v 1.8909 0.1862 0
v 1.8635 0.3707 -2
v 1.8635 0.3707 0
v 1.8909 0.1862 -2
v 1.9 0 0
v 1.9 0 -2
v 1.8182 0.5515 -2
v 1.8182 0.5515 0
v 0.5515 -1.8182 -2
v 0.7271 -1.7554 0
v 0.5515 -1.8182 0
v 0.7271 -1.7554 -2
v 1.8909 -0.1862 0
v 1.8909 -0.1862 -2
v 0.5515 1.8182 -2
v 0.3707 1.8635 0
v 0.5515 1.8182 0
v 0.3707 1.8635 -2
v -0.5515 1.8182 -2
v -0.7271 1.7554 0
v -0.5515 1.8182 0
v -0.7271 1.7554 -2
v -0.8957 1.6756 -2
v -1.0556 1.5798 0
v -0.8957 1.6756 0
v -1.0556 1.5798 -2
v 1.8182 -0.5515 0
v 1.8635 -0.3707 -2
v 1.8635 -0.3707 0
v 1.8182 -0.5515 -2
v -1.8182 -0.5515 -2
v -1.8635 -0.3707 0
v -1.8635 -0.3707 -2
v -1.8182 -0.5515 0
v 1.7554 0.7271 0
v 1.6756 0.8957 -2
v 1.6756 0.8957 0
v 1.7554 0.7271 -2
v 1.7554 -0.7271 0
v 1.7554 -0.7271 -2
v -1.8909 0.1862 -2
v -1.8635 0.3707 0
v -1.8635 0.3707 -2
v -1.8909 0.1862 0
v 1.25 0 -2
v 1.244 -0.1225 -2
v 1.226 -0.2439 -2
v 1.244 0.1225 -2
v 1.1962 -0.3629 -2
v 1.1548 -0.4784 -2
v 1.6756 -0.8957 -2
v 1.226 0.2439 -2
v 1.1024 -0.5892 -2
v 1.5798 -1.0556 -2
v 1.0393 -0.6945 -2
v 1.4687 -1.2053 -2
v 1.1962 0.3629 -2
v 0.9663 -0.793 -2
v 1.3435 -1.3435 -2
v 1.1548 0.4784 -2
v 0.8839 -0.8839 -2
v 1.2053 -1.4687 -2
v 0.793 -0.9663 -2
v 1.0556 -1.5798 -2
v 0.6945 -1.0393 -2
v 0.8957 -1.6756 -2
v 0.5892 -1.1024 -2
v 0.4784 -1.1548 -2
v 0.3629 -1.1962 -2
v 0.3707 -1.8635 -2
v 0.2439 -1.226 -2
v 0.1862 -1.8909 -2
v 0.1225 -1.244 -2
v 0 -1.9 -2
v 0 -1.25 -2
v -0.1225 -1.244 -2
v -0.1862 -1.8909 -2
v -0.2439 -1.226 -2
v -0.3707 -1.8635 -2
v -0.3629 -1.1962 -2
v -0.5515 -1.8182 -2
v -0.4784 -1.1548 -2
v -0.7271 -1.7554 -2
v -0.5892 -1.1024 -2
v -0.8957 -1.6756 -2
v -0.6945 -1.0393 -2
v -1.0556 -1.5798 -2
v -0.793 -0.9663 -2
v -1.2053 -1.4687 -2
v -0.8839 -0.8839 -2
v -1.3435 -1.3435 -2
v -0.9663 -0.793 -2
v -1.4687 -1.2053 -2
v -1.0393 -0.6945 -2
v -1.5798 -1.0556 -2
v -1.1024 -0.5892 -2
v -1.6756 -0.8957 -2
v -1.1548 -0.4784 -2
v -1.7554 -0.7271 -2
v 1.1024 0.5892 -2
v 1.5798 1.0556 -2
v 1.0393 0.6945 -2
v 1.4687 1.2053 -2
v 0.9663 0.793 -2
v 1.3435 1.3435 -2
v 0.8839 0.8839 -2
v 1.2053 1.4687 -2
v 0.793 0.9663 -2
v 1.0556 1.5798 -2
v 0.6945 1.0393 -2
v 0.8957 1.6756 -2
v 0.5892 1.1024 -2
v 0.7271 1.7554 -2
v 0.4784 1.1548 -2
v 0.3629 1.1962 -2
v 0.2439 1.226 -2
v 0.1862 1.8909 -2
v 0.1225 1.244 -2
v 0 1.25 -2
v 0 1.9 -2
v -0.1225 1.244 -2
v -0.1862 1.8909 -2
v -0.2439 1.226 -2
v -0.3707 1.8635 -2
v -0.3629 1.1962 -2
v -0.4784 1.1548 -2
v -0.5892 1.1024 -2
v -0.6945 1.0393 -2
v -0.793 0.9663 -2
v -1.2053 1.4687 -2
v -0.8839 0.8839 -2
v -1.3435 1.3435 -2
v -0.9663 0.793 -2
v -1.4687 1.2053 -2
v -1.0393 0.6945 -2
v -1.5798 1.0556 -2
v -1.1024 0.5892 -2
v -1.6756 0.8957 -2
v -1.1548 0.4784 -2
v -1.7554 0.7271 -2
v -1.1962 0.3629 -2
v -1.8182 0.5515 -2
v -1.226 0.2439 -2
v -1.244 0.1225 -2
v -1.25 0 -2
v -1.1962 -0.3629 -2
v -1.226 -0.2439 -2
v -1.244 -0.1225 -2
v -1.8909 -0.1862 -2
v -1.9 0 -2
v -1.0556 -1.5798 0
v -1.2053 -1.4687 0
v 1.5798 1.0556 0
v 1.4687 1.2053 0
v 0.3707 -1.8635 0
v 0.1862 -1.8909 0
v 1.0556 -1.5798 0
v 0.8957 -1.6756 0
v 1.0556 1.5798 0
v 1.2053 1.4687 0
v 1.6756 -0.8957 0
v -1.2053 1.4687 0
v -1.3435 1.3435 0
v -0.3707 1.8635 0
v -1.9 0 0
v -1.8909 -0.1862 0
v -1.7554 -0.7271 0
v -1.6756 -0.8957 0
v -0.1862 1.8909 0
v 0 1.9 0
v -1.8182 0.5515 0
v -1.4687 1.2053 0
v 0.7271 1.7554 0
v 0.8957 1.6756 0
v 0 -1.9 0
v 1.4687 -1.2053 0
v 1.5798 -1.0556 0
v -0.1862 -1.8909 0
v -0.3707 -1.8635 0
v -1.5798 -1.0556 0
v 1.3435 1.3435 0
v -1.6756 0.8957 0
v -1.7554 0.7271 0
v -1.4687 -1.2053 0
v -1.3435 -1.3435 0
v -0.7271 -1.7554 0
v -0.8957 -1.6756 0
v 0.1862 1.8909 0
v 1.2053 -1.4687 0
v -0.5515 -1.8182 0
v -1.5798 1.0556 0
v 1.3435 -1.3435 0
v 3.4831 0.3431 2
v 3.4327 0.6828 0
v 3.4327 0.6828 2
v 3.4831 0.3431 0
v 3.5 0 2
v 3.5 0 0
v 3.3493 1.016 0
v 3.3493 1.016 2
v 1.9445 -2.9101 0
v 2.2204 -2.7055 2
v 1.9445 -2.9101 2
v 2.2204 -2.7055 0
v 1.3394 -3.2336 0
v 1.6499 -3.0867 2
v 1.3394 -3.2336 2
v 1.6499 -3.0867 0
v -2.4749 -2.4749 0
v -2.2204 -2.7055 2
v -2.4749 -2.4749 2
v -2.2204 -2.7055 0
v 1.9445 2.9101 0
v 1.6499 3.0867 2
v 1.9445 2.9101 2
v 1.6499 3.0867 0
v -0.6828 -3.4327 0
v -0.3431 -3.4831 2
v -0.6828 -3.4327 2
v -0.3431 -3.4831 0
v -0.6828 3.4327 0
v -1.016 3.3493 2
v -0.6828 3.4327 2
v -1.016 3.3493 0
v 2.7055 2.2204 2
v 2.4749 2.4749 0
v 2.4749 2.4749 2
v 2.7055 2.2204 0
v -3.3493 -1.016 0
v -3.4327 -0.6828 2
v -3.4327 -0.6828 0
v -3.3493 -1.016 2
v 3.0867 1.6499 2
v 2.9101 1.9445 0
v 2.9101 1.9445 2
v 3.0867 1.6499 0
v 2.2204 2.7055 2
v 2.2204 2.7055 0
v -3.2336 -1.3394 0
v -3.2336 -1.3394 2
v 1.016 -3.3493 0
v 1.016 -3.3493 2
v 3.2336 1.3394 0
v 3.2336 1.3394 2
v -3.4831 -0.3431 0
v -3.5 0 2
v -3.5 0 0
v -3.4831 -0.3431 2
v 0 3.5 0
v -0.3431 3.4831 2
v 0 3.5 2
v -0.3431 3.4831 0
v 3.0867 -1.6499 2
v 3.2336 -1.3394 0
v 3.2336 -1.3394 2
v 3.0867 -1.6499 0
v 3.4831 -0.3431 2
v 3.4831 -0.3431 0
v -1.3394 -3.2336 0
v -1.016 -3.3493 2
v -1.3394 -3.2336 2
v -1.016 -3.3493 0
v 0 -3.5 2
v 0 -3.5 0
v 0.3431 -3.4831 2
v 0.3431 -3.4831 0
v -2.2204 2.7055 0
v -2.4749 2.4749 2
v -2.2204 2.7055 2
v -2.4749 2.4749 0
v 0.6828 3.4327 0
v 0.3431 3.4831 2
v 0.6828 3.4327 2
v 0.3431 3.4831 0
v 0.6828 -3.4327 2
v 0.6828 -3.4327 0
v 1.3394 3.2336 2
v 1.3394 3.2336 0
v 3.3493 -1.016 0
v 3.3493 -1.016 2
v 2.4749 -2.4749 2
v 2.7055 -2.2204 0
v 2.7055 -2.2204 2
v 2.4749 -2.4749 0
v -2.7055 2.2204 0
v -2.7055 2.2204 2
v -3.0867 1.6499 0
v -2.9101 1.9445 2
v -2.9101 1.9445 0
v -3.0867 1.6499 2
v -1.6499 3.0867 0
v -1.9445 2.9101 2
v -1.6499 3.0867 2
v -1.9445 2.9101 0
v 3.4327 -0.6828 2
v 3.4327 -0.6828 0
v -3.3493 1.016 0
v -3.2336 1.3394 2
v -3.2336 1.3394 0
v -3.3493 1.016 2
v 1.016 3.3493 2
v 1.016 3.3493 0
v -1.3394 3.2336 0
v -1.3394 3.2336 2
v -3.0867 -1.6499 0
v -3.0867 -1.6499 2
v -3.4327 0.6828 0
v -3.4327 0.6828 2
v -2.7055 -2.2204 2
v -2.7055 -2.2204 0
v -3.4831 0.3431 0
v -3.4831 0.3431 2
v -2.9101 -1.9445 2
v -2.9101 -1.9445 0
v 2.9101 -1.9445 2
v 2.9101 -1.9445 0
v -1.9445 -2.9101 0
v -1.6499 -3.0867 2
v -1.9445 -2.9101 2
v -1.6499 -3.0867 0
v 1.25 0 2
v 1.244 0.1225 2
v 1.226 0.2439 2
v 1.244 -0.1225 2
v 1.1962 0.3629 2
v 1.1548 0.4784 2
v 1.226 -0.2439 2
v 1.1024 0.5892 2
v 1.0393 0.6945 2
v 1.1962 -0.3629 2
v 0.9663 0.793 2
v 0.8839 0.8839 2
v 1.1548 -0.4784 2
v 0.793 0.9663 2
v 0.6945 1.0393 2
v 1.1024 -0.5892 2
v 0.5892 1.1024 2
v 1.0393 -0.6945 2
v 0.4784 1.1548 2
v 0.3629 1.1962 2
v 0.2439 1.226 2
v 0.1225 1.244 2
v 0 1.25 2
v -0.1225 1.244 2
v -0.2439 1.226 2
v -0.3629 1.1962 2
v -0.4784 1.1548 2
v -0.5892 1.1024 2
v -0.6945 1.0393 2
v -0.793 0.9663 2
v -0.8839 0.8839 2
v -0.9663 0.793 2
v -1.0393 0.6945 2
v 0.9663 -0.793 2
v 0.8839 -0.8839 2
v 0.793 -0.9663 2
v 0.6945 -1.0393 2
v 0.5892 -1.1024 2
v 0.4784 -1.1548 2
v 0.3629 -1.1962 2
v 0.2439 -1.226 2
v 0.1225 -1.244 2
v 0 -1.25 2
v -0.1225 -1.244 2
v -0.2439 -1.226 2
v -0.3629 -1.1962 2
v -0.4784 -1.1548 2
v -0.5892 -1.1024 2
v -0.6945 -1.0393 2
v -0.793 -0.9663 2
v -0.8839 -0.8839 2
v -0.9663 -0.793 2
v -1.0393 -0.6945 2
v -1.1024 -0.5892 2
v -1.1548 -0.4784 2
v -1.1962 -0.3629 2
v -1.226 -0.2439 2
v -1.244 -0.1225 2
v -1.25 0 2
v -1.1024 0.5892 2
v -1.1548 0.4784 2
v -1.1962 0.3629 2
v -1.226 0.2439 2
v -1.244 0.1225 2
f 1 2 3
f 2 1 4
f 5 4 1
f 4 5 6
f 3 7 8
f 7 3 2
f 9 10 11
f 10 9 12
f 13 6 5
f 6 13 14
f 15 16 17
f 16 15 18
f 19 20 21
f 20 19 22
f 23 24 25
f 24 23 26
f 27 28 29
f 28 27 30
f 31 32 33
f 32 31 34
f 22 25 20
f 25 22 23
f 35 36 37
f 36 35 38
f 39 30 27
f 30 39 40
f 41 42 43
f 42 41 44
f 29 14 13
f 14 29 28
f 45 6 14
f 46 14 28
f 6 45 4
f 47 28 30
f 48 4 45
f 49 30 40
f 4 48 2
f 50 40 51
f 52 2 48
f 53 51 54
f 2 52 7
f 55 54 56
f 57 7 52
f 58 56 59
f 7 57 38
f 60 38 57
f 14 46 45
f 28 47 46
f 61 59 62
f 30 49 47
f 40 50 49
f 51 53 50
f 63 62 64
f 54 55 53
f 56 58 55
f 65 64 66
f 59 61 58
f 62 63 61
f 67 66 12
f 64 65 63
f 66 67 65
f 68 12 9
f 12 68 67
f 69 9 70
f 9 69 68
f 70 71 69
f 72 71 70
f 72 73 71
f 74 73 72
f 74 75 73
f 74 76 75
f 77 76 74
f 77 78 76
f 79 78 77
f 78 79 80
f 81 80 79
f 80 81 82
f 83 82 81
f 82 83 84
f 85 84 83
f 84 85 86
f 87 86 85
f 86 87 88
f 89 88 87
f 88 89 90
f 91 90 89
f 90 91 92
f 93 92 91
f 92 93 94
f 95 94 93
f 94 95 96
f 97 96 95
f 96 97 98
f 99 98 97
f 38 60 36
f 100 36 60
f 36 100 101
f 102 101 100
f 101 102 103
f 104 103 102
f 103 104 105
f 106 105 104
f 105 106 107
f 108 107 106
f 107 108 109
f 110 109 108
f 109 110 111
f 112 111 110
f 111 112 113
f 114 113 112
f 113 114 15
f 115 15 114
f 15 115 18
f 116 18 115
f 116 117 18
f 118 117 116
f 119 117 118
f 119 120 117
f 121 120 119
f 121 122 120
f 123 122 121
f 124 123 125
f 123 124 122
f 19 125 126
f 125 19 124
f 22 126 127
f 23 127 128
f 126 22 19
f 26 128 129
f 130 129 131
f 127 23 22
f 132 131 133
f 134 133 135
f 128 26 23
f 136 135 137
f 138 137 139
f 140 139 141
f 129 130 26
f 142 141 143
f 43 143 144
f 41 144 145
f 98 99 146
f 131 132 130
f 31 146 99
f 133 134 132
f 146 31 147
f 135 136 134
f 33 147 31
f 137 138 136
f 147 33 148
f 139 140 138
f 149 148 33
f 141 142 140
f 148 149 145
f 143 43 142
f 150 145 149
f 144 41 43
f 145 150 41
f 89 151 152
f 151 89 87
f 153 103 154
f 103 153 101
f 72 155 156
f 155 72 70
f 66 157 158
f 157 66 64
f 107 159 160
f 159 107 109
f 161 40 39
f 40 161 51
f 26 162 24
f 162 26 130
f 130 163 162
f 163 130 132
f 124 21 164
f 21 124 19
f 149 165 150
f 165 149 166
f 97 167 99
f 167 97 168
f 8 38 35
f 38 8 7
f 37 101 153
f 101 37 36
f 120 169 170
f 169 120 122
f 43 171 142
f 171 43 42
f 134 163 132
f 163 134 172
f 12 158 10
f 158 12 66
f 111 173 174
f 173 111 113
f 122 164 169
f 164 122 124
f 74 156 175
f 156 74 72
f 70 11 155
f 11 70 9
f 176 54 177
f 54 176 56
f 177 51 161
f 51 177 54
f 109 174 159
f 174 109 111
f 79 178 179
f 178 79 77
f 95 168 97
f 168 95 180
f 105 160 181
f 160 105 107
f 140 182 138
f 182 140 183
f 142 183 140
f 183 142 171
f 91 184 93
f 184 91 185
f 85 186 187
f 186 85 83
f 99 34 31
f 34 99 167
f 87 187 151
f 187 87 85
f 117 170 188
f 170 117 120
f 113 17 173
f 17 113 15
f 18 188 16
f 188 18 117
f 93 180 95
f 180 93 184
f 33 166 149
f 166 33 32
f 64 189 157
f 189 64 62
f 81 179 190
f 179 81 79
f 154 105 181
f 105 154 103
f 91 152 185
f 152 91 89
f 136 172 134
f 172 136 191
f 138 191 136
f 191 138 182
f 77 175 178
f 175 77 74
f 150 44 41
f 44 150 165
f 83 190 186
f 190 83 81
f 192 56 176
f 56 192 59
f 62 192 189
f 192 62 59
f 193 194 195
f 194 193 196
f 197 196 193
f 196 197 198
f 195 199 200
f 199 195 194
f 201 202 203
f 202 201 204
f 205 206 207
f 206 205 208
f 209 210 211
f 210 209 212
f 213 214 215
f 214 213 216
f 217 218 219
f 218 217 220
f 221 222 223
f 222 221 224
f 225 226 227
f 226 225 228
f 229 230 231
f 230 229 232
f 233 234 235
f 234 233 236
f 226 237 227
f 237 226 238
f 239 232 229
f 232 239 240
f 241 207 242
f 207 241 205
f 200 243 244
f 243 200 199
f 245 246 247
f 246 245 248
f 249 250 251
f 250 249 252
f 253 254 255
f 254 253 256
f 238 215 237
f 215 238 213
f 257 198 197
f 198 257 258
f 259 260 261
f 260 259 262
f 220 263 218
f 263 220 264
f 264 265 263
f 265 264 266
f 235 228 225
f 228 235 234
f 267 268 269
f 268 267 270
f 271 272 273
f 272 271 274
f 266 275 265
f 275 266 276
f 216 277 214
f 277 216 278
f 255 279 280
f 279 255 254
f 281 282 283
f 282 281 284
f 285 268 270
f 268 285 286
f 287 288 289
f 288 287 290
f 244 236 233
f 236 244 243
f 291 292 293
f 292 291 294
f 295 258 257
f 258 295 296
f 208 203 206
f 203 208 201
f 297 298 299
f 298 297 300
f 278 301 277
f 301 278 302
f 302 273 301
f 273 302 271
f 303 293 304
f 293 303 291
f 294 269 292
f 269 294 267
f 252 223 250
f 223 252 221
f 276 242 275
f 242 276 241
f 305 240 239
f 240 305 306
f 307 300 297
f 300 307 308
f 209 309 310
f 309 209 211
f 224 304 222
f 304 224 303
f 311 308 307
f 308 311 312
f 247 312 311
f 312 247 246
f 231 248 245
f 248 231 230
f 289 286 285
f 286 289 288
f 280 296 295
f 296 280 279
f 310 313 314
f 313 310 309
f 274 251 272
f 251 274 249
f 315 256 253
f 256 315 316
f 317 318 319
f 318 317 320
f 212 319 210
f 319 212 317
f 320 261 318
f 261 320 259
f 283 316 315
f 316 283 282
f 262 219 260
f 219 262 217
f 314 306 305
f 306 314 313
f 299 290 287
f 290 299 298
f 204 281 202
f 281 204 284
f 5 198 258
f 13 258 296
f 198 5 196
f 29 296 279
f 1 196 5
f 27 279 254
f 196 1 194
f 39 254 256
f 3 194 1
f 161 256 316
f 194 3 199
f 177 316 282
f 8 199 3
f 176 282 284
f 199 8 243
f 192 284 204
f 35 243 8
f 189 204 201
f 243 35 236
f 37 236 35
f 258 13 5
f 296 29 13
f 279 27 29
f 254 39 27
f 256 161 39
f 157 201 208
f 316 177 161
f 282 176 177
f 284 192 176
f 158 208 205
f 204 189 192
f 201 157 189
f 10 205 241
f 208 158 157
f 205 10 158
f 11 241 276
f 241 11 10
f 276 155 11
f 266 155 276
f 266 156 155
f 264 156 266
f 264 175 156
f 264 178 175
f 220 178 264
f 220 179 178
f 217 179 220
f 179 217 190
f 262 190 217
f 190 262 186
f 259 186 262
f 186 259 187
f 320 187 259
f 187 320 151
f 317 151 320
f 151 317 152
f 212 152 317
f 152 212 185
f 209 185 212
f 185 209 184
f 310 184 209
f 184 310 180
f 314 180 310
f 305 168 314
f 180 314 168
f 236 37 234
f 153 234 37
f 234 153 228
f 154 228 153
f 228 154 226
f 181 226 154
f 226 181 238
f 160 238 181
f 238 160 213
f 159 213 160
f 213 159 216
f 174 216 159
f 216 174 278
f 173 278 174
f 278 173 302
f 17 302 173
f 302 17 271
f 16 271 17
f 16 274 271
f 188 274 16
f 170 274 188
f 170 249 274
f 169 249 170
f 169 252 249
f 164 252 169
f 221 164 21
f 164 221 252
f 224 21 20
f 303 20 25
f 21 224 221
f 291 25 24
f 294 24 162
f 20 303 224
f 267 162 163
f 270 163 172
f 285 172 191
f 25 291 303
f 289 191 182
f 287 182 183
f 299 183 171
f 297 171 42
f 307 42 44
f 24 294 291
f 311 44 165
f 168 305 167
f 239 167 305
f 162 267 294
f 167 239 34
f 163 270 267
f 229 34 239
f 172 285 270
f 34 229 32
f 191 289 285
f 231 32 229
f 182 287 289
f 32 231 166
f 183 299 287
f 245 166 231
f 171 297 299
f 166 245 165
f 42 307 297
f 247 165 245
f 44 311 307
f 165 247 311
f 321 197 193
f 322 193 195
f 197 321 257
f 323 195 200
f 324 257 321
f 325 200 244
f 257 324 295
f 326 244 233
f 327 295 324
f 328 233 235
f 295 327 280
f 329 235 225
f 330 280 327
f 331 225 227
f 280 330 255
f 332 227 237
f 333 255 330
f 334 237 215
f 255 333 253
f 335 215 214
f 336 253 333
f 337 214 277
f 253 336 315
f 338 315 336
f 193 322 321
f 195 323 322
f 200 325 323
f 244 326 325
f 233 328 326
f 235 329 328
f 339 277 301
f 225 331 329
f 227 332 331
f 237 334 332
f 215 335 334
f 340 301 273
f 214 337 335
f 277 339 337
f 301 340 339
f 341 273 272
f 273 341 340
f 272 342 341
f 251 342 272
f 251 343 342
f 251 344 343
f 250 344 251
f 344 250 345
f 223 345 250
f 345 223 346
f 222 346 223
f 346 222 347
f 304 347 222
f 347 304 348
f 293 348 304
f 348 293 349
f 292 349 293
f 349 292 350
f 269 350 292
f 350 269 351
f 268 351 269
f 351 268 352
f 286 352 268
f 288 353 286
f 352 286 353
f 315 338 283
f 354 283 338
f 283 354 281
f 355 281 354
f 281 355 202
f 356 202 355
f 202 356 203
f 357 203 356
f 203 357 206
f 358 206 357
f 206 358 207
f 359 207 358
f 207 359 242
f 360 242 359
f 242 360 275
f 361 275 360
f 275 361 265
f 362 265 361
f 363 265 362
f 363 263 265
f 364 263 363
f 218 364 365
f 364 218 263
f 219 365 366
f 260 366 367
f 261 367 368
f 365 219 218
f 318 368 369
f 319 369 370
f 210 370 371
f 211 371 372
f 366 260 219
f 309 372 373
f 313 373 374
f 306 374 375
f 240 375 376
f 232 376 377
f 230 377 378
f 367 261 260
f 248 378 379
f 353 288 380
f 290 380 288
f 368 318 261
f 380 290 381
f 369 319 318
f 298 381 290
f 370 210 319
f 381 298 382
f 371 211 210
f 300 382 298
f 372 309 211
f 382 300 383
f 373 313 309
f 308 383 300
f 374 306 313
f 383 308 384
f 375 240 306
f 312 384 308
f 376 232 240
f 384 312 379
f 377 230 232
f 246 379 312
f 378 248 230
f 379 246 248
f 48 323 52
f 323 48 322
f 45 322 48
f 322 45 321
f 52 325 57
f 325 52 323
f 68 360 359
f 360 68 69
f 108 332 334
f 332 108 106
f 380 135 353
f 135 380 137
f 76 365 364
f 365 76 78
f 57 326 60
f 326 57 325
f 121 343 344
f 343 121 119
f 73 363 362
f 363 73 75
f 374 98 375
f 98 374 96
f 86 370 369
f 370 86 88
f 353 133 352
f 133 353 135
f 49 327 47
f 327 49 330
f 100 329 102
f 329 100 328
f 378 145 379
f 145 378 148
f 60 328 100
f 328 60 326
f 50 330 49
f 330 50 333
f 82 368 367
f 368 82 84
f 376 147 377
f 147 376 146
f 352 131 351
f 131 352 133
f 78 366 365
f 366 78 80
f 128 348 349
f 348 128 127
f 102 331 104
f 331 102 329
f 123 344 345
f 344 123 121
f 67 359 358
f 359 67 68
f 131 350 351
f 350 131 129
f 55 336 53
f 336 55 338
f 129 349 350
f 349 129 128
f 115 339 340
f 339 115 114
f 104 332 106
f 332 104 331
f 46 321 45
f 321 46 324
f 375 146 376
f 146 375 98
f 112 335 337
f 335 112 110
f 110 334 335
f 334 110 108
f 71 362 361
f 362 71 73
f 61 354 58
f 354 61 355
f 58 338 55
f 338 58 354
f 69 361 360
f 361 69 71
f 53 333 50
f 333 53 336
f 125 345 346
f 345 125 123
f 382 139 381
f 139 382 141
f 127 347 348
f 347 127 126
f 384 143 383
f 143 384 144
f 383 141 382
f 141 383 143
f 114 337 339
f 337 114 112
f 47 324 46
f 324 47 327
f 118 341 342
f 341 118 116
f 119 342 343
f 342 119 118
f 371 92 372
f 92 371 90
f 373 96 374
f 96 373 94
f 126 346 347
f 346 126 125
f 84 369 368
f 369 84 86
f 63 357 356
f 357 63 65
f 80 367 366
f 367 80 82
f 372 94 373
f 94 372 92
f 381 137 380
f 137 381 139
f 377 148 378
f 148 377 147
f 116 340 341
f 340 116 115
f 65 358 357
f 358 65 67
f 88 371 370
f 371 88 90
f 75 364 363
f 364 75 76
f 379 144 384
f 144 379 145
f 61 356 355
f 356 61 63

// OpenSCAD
// file: parts.scad
/**
 * Martin Egli
 * 2022-10-30
 * 12 cm ventilator to suck solder fumes
 */

module vent12cm(col = "Gray", loc_res = 32) {
    distxy = (110+100.5)/2;
    distxy2 = distxy/2;

    color(col) {
        difference() {
            union() {    
                hull() {
                    translate([+distxy2, +distxy2, 0])
                    cylinder(r=7.5, h=25, $fn = loc_res);
                    translate([+distxy2, -distxy2, 0])
                    cylinder(r=7.5, h=25, $fn = loc_res);
                    translate([-distxy2, +distxy2, 0])
                    cylinder(r=7.5, h=25, $fn = loc_res);
                    translate([-distxy2, -distxy2, 0])
                    cylinder(r=7.5, h=25, $fn = loc_res);
                }
            }
            // M4 holes
            translate([+distxy2, +distxy2, -1])
            cylinder(d=4.5, h=25+2, $fn = loc_res);
            translate([+distxy2, -distxy2, -1])
            cylinder(d=4.5, h=25+2, $fn = loc_res);
            translate([-distxy2, +distxy2, -1])
            cylinder(d=4.5, h=25+2, $fn = loc_res);
            translate([-distxy2, -distxy2, -1])
            cylinder(d=4.5, h=25+2, $fn = loc_res);
            // center hole for vent
            translate([0, 0, -1])
            cylinder(d=120-2-2, h=25+2, $fn = loc_res);
        }
        translate([0, 0, 0])
        cylinder(d=40, h=4, $fn = loc_res);
        translate([0, 0, 5])
        cylinder(d=40, h=20, $fn = loc_res);

        r1 = (20-2);
        for(n=[0:1:3]) {
            hull() {
                translate([r1*sin(n*90+45), r1*cos(n*90+45), 0])
                cylinder(d=4, h=4, $fn = loc_res);
                translate([r1*sin(n*90+45)+64*sin(n*90+(45+90)), r1*cos(n*90+45)+64*cos(n*90+(45+90)), 0])
                cylinder(d=4, h=4, $fn = loc_res);
            }
        }
    }
}

module filter(col = "Gray", loc_res = 32) {
    color(col)
    translate([-130/2, -130/2, 0])
    cube([130, 130, 11]);
}
// main file
/**
 * Martin Egli
 * 2022-10-30
 * 12 cm ventilator to suck solder fumes
 */
use <parts.scad>

module part1(col = "LightGreen", loc_res = 32) {
    distxy = (110+100.5)/2;
    distxy2 = distxy/2;
    distxy3 = 132/2 - 15/2 +3;
    distz = 12;

    color(col) {
        difference() {
            union() {   
                hull() { 
                    hull() {
                        translate([+distxy2, +distxy2, 0])
                        cylinder(r=7.5, h=0.1, $fn = loc_res);
                        translate([+distxy2, -distxy2, 0])
                        cylinder(r=7.5, h=0.1, $fn = loc_res);
                        translate([-distxy2, +distxy2, 0])
                        cylinder(r=7.5, h=0.1, $fn = loc_res);
                        translate([-distxy2, -distxy2, 0])
                        cylinder(r=7.5, h=0.1, $fn = loc_res);
                    }

                    hull() {
                        translate([+distxy3, +distxy3, distz])
                        cylinder(r=7.5, h=0.1, $fn = loc_res);
                        translate([+distxy3, -distxy3, distz])
                        cylinder(r=7.5, h=0.1, $fn = loc_res);
                        translate([-distxy3, +distxy3, distz])
                        cylinder(r=7.5, h=0.1, $fn = loc_res);
                        translate([-distxy3, -distxy3, distz])
                        cylinder(r=7.5, h=0.1, $fn = loc_res);
                    }
                }
                // holder
                hull() {
                    translate([132/2+distz*3/4, 20/2, distz/2])
                    rotate([90, 0, 0])
                    cylinder(d = distz, h = 20, $fn = loc_res);
                    translate([0, 20/2, distz/2])
                    rotate([90, 0, 0])
                    cylinder(d = distz, h = 20, $fn = loc_res);
                }
            }
            // M3 holes
            translate([+distxy2, +distxy2, -1])
            cylinder(d=3, h=distz+20, $fn = loc_res);
            translate([+distxy2, -distxy2, -1])
            cylinder(d=3, h=distz+20, $fn = loc_res);
            translate([-distxy2, +distxy2, -1])
            cylinder(d=3, h=distz+20, $fn = loc_res);
            translate([-distxy2, -distxy2, -1])
            cylinder(d=3, h=distz+20, $fn = loc_res);
            // M3 hole for holder
            #translate([132/2+distz*3/4, 20/2+1, distz/2])
            rotate([90, 0, 0])
            cylinder(d = 3, h = 20+2, $fn = loc_res);
            // center hole for vent
            translate([0, 0, -1])
            cylinder(d1=120-2-2, d2 = (120-2-2)+16, h=distz+2, $fn = loc_res);
        }
        // honeycomb separator
        honey_th = 2;
        honey_rad = 10;
        honey_dia = 10-0.5;
        translate([0, 0, distz-honey_th]) {
            difference() {
                translate([0, 0, 0])
                cylinder(d = (120-2-2)+16, h=honey_th+0.1, $fn = loc_res);
                for(n = [-7:1:7]) {
                    for(m = [-7:1:7]) {
                        xmov = n*honey_rad*sin(60);
                        ymov = n*honey_rad*cos(60);
                        translate([xmov, m*honey_rad+ymov, -1])
                        cylinder(d = honey_dia, h = honey_th+2, $fn = 6);
                    }
                }
            }
        }
    }
}

module part2(col = "Red", loc_res = 32) {
    distxy = (110+100.5)/2;
    distxy2 = distxy/2;
    distxy3 = 132/2 - 15/2 +3;
    distxy4 = 132/2 - 15/2 +1;
    edge_rad = (15-2)/2;
    distz = 12;

    color(col) {
        difference() {
            union() {
                difference() {
                    union() {    
                        hull() {
                            translate([+distxy3, +distxy3, 0])
                            cylinder(r=7.5, h=distz, $fn = loc_res);
                            translate([+distxy3, -distxy3, 0])
                            cylinder(r=7.5, h=distz, $fn = loc_res);
                            translate([-distxy3, +distxy3, 0])
                            cylinder(r=7.5, h=distz, $fn = loc_res);
                            translate([-distxy3, -distxy3, 0])
                            cylinder(r=7.5, h=distz, $fn = loc_res);
                        }
                    }
                    // center hole for vent
                    hull() {
                            translate([+distxy4, +distxy4, -1])
                            cylinder(r=edge_rad, h=distz+2, $fn = loc_res);
                            translate([+distxy4, -distxy4, -1])
                            cylinder(r=edge_rad, h=distz+2, $fn = loc_res);
                            translate([-distxy4, +distxy4, -1])
                            cylinder(r=edge_rad, h=distz+2, $fn = loc_res);
                            translate([-distxy4, -distxy4, -1])
                            cylinder(r=edge_rad, h=distz+2, $fn = loc_res);
                        }
                    
                }
            
                // honeycomb grill
                honey_th = 2;
                honey_rad = 11;
                honey_dia = 11.5;
                translate([0, 0, distz-honey_th]) {
                    difference() {
                        hull() {
                            translate([+distxy4, +distxy4, 0])
                            cylinder(r=edge_rad, h=honey_th, $fn = loc_res);
                            translate([+distxy4, -distxy4, 0])
                            cylinder(r=edge_rad, h=honey_th, $fn = loc_res);
                            translate([-distxy4, +distxy4, 0])
                            cylinder(r=edge_rad, h=honey_th, $fn = loc_res);
                            translate([-distxy4, -distxy4, 0])
                            cylinder(r=edge_rad, h=honey_th, $fn = loc_res);
                        }
                        for(n = [-10:1:10]) {
                            for(m = [-10:1:10]) {
                                xmov = n*honey_rad*sin(60);
                                ymov = n*honey_rad*cos(60);
                                translate([xmov, m*honey_rad+ymov, -1])
                                cylinder(d = honey_dia, h = honey_th+2, $fn = 6);
                            }
                        }
                    }
                }
                // screw mounts
                translate([0, 0, distz-honey_th]) {
                    union() {
                        translate([+distxy2, +distxy2, 0])
                        cylinder(d=10, honey_th, $fn = loc_res);
                        translate([+distxy2, -distxy2, 0])
                        cylinder(d=10, honey_th, $fn = loc_res);
                        translate([-distxy2, +distxy2, 0])
                        cylinder(d=10, honey_th, $fn = loc_res);
                        translate([-distxy2, -distxy2, 0])
                        cylinder(d=10, honey_th, $fn = loc_res);
                    }
                }
            }
            // M3 holes
            translate([+distxy2, +distxy2, -1])
            cylinder(d=3, h=distz+20, $fn = loc_res);
            translate([+distxy2, -distxy2, -1])
            cylinder(d=3, h=distz+20, $fn = loc_res);
            translate([-distxy2, +distxy2, -1])
            cylinder(d=3, h=distz+20, $fn = loc_res);
            translate([-distxy2, -distxy2, -1])
            cylinder(d=3, h=distz+20, $fn = loc_res);
        }
    }
}

// stand
module part3(col = "Violet", loc_res = 32) {
    distxy = (110+100.5)/2;
    distxy2 = distxy/2;
    distxy3 = 132/2 - 15/2 +3;
    distz = 12;

    color(col) {
        difference() {
            union() {   
                // holder
                hull() {
                    translate([0, -20/2, distz/2])
                    rotate([90, 0, 0])
                    cylinder(d = distz, h = 10, $fn = loc_res);
                    translate([2*distz, -20/2, distz/2])
                    rotate([90, 0, 0])
                    cylinder(d = distz, h = 10, $fn = loc_res);
                }
                hull() {
                    translate([0, 20, distz/2])
                    rotate([90, 0, 0])
                    cylinder(d = distz, h = 10, $fn = loc_res);
                    translate([2*distz, 20, distz/2])
                    rotate([90, 0, 0])
                    cylinder(d = distz, h = 10, $fn = loc_res);
                }
                hull() {
                    translate([2*distz, +(20-5), distz/2])
                    rotate([0, 90, 0])
                    cylinder(d = 14, h = distz/2, $fn = loc_res);
                    translate([2*distz+3, -(20-5), distz/2])
                    rotate([0, 90, 0])
                    cylinder(d = distz/2, h = distz/2/2, $fn = loc_res);
                }
                hull() {
                    translate([2*distz+3, +(20-5), distz/2])
                    rotate([0, 90, 0])
                    cylinder(d = distz/2, h = distz/2/2, $fn = loc_res);
                    translate([2*distz, -(20-5), distz/2])
                    rotate([0, 90, 0])
                    cylinder(d = 14, h = distz/2, $fn = loc_res);
                }
                hull() {
                    translate([2*distz, +(20-5), distz/2])
                    rotate([0, 90, 0])
                    cylinder(d = 14, h = distz/2, $fn = loc_res);
                    translate([2*distz+3, +50, 35])
                    rotate([0, 90, 0])
                    cylinder(d = 6, h = distz/2/2, $fn = loc_res);
                }
                hull() {
                    translate([2*distz, +(20-5), distz/2])
                    rotate([0, 90, 0])
                    cylinder(d = 14, h = distz/2, $fn = loc_res);
                    translate([2*distz+3, +50, -35])
                    rotate([0, 90, 0])
                    cylinder(d = 6, h = distz/2/2, $fn = loc_res);
                }
                hull() {
                    translate([2*distz, -(20-5), distz/2])
                    rotate([0, 90, 0])
                    cylinder(d = 14, h = distz/2, $fn = loc_res);
                    translate([2*distz+3, -50, 35])
                    rotate([0, 90, 0])
                    cylinder(d = 6, h = distz/2/2, $fn = loc_res);
                }
                hull() {
                    translate([2*distz, -(20-5), distz/2])
                    rotate([0, 90, 0])
                    cylinder(d = 14, h = distz/2, $fn = loc_res);
                    translate([2*distz+3, -50, -35])
                    rotate([0, 90, 0])
                    cylinder(d = 6, h = distz/2/2, $fn = loc_res);
                }
            }
            // M3 screw
            translate([0, 25, distz/2])
            rotate([90, 0, 0])
            cylinder(d = 3, h = 50, $fn = loc_res);
            translate([0, 25, distz/2])
            rotate([90, 0, 0])
            cylinder(d = 7, h = 5+2, $fn = loc_res);
            translate([0, 25-45+2, distz/2])
            rotate([90, 0, 0])
            cylinder(d = 6.5, h = 2+2, $fn = 6);
        }
    }

}

module part4(col = "Violet", loc_res = 32) {
    color(col) {
        difference() {
            union() {
                translate([0, 0, -2])
                cylinder(d = 3.8, h = 3, $fn = loc_res);
                translate([0, 0, 0])
                cylinder(d = 7, h = 2, $fn = loc_res);
            }
            translate([0, 0, -3])
            cylinder(d = 2.5, h = 10, $fn = loc_res);
        }
    }
}

module put_together(loc_res = 32) {
    translate([0, 0, 0])
    vent12cm("orange");

    translate([0, 0, 26])
    part1();

    translate([0, 0, 40])
    filter("LightBlue");

    translate([0, 0, 55])
    part2();

    translate([120, 0, 26])
    part3();
}

//put_together();


// Printing
//part1("Green", 64);    // 1x
//part2("Green", 64);    // 1x
//part3("Green", 64);    // 1x
part4("Green", 64);    // 4x
